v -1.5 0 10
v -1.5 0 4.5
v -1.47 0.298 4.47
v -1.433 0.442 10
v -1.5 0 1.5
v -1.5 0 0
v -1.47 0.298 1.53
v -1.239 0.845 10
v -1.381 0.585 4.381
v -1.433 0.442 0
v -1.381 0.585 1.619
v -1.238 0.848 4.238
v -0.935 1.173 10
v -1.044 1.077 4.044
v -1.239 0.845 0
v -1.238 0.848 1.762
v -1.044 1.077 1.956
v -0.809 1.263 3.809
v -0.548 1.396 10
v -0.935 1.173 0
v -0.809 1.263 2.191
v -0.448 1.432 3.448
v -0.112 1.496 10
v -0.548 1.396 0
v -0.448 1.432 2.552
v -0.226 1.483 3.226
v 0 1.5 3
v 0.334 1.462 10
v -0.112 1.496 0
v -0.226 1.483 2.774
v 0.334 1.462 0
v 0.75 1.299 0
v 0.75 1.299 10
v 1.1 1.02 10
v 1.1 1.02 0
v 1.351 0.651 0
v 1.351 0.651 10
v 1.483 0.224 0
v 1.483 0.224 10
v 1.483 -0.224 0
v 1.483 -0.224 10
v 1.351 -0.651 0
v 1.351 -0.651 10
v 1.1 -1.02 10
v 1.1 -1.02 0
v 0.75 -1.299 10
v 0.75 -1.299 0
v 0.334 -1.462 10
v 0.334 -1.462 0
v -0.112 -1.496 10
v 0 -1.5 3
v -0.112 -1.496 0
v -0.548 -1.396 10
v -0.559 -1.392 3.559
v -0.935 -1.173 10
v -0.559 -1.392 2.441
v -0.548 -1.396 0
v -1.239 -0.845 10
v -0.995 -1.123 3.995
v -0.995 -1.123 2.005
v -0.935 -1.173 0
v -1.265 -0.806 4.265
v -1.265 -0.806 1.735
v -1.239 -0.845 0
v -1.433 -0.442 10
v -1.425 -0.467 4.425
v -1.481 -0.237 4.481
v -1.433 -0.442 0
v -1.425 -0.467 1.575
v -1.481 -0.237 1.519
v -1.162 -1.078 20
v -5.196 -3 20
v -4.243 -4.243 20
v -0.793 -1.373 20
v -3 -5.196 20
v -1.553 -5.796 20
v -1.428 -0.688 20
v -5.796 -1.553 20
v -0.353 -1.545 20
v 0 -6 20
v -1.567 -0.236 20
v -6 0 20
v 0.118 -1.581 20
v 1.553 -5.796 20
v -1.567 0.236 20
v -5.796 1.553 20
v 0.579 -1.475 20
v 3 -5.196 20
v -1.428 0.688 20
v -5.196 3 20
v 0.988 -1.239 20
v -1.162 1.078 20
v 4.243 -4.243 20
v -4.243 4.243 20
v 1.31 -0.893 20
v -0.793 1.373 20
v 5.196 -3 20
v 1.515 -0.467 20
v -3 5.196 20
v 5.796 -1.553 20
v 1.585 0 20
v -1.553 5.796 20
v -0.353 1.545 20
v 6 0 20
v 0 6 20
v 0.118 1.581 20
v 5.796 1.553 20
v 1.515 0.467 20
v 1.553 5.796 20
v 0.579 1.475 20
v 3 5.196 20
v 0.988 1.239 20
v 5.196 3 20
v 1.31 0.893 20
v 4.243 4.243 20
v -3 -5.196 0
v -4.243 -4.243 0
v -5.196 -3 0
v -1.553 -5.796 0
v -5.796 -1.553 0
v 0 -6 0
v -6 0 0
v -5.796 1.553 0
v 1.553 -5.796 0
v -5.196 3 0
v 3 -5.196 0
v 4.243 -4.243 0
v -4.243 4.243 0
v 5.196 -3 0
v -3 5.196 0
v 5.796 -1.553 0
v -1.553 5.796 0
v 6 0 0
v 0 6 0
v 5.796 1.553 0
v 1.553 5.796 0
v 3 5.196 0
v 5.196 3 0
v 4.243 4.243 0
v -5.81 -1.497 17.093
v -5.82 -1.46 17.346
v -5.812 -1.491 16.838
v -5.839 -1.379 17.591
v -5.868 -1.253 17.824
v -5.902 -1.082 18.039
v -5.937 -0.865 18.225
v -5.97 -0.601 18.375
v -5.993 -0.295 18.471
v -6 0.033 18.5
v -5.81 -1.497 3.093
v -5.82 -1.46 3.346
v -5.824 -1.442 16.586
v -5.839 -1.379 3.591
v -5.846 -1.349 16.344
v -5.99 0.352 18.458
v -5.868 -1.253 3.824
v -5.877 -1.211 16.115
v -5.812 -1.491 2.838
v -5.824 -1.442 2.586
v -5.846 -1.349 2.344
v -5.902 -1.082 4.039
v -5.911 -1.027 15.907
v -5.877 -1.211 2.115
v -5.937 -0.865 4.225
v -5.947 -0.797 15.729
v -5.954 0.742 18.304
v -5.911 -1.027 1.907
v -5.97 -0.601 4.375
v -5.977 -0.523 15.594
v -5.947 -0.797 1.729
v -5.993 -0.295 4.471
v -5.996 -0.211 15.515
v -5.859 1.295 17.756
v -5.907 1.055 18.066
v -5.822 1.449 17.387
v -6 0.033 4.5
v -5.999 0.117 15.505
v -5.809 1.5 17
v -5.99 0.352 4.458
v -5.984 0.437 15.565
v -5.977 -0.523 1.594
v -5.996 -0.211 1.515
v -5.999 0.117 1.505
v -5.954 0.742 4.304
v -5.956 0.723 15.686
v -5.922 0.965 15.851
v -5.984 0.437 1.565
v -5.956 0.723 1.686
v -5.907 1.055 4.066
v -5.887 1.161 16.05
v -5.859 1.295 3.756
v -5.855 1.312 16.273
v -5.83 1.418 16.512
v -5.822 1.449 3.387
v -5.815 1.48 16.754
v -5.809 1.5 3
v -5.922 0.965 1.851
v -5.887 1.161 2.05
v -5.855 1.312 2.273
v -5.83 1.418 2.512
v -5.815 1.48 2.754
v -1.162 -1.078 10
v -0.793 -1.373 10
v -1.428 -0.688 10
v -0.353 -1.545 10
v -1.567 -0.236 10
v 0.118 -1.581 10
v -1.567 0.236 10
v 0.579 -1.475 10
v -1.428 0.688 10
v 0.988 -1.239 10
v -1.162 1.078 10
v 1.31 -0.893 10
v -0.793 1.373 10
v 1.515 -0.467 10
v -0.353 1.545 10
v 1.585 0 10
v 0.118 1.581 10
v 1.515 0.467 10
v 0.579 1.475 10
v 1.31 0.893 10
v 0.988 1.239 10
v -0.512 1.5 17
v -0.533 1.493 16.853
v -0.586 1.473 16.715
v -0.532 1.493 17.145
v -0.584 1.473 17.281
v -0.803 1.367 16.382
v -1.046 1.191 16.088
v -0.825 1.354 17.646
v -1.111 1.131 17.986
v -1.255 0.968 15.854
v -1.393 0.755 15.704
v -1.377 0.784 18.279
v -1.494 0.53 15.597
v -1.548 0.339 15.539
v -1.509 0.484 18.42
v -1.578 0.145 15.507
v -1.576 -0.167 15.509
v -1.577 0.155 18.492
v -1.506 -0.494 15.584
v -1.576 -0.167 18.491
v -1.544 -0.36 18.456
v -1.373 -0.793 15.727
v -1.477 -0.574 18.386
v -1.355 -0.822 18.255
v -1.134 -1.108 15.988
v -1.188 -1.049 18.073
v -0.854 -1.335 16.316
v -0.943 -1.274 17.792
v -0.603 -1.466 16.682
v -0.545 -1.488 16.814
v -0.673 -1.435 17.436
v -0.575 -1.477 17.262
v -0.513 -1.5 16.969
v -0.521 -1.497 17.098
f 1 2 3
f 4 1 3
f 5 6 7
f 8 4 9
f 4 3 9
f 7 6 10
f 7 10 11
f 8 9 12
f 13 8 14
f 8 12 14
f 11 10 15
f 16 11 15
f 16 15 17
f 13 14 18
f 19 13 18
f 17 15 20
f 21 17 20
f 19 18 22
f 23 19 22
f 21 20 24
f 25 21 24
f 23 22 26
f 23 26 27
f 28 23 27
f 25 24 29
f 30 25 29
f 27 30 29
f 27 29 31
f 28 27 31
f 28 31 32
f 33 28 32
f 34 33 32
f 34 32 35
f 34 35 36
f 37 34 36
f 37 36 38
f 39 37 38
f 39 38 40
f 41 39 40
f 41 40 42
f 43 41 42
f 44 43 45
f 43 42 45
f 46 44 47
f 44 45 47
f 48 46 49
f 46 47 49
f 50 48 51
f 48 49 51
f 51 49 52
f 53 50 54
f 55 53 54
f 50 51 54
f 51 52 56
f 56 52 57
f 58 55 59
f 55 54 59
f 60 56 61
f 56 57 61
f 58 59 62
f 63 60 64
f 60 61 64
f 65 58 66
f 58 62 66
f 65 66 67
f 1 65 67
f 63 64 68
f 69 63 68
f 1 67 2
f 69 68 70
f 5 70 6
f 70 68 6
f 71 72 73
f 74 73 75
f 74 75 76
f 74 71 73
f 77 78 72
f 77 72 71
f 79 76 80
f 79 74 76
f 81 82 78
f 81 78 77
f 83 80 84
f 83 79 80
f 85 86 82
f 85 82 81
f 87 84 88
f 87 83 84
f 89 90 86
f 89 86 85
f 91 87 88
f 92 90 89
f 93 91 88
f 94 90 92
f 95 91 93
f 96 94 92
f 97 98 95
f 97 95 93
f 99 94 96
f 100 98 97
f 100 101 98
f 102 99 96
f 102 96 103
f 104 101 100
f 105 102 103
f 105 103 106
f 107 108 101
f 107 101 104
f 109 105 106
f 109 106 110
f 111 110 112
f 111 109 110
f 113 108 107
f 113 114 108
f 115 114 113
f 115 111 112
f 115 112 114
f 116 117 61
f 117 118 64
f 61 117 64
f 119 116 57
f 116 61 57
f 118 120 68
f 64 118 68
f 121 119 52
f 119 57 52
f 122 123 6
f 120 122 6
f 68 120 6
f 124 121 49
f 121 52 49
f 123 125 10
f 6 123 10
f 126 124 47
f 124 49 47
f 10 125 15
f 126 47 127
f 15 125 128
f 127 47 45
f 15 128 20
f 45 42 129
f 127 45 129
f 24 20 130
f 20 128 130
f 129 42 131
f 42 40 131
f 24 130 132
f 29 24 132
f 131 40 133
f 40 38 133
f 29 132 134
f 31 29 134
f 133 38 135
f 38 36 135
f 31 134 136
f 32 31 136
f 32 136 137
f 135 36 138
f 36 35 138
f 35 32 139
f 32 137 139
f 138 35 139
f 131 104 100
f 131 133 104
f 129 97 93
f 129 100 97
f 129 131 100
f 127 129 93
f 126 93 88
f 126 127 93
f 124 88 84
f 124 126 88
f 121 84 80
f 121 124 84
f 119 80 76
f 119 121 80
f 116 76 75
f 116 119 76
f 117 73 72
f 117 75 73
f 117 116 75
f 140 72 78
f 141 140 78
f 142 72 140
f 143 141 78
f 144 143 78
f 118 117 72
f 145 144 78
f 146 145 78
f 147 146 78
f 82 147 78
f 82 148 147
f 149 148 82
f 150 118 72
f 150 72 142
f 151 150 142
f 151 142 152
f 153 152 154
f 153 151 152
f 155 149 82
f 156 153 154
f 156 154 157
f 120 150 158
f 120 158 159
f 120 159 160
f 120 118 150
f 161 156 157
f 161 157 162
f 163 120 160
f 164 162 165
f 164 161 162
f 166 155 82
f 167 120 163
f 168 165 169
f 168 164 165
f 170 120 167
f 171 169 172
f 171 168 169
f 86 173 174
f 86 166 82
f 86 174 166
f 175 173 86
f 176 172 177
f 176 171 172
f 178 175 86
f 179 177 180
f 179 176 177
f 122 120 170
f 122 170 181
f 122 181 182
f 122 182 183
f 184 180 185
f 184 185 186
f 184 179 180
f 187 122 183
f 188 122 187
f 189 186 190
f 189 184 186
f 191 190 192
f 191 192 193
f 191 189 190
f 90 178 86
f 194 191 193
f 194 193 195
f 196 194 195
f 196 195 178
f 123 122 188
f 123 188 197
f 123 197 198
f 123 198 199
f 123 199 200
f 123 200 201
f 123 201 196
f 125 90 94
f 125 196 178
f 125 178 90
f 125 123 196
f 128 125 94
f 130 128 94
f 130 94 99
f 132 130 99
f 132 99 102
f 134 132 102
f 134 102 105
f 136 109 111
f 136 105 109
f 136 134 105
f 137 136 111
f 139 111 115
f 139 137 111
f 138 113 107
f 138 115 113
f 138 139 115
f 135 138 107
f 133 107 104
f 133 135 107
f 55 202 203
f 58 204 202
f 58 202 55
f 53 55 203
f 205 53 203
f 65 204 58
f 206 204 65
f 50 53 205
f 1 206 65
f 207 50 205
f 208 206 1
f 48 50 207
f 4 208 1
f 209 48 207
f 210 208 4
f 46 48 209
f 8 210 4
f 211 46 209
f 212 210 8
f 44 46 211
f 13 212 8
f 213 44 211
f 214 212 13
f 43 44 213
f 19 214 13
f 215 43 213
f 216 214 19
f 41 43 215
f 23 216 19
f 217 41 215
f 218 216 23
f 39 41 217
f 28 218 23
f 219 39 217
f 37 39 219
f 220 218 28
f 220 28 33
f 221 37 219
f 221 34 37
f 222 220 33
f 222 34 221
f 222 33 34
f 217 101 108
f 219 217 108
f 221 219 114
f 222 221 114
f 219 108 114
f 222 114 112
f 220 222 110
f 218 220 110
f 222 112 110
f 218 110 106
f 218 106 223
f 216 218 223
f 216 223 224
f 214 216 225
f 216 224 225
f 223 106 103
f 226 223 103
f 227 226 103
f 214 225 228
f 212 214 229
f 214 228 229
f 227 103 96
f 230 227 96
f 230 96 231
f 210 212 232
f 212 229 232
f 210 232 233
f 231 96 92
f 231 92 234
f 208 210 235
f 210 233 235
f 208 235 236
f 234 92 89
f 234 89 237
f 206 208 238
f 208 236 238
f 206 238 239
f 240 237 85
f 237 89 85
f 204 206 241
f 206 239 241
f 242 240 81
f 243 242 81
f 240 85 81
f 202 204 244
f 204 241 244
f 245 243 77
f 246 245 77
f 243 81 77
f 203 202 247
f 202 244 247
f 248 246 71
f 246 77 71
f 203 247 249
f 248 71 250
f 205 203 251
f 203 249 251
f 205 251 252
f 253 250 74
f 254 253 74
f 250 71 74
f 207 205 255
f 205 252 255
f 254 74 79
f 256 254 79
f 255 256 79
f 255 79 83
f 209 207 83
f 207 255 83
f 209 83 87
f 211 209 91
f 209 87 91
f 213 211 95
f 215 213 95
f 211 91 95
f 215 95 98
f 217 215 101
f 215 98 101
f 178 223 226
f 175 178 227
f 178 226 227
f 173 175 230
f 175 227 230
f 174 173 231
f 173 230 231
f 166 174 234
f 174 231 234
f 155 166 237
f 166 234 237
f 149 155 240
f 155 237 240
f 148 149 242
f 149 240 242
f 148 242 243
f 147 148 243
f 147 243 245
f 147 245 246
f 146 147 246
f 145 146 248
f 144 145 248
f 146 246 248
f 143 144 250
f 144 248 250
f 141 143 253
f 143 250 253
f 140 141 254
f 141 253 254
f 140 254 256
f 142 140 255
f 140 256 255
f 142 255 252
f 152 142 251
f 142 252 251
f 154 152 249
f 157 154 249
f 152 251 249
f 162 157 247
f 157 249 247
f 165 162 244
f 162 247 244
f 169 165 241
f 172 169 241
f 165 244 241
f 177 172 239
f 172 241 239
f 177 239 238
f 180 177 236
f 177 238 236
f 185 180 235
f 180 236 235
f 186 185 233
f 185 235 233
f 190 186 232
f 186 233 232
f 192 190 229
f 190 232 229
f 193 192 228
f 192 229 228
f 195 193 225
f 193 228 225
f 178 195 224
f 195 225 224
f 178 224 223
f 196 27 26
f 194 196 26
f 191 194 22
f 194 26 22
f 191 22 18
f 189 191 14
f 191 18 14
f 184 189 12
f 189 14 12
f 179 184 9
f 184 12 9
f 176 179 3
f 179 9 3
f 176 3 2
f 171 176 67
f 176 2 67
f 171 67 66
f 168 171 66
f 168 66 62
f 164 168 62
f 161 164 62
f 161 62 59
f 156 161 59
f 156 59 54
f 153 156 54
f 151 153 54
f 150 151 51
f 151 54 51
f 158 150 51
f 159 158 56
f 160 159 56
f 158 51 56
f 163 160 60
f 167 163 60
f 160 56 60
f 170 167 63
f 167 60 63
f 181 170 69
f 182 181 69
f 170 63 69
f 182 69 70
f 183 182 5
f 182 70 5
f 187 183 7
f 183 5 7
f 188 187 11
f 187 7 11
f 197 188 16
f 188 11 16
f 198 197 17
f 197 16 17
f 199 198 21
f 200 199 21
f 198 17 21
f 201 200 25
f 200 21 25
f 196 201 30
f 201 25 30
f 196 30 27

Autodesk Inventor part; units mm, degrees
ref_plane "YZ Plane" through (0, 0, 0) normal (1, 0, 0) x (0, 1, 0)
ref_plane "XZ Plane" through (0, 0, 0) normal (0, 1, 0) x (-1, 0, 0)
ref_plane "XY Plane" through (0, 0, 0) normal (0, 0, 1) x (1, 0, 0)
sketch "Sketch1" plane through (0, 0, 0) normal (0, 0, 1) x (1, 0, 0)
  circle A0 centre (0, 0) radius 6
  dimension "d0" = 12
extrude "Extrusion1" add sketch "Sketch1" along normal blind 20
sketch "Sketch2" plane through (0, 0, 20) normal (0, 0, 1) x (1, 0, 0)
  circle A0 centre (0, 0) radius 1.585
  dimension "d3" = 3.17
extrude "Extrusion2" cut sketch "Sketch2" against normal blind 10
sketch "Sketch3" plane through (0, 0, 0) normal (0, 0, -1) x (-1, 0, 0)
  circle A0 centre (0, 0) radius 1.5
  dimension "d6" = 3
extrude "Extrusion3" cut sketch "Sketch3" against normal blind 10
sketch "Sketch4" plane through (0, 0, 0) normal (1, 0, 0) x (0, 1, 0)
  circle A0 centre (0, 17) radius 1.5
  circle A1 centre (0, 3) radius 1.5
  line L0 (6, 20) -> (-6, 20) projected
  point P0 (0, 0)
  dimension "d9" = 3
  dimension "d10" = 3
  dimension "d11" = 3
extrude "Extrusion4" cut sketch "Sketch4" against normal through all
equation "\"d11\" = d10"
properties part number "3mm_.125inch_ShaftCoupler" material "Aluminum 6061"
